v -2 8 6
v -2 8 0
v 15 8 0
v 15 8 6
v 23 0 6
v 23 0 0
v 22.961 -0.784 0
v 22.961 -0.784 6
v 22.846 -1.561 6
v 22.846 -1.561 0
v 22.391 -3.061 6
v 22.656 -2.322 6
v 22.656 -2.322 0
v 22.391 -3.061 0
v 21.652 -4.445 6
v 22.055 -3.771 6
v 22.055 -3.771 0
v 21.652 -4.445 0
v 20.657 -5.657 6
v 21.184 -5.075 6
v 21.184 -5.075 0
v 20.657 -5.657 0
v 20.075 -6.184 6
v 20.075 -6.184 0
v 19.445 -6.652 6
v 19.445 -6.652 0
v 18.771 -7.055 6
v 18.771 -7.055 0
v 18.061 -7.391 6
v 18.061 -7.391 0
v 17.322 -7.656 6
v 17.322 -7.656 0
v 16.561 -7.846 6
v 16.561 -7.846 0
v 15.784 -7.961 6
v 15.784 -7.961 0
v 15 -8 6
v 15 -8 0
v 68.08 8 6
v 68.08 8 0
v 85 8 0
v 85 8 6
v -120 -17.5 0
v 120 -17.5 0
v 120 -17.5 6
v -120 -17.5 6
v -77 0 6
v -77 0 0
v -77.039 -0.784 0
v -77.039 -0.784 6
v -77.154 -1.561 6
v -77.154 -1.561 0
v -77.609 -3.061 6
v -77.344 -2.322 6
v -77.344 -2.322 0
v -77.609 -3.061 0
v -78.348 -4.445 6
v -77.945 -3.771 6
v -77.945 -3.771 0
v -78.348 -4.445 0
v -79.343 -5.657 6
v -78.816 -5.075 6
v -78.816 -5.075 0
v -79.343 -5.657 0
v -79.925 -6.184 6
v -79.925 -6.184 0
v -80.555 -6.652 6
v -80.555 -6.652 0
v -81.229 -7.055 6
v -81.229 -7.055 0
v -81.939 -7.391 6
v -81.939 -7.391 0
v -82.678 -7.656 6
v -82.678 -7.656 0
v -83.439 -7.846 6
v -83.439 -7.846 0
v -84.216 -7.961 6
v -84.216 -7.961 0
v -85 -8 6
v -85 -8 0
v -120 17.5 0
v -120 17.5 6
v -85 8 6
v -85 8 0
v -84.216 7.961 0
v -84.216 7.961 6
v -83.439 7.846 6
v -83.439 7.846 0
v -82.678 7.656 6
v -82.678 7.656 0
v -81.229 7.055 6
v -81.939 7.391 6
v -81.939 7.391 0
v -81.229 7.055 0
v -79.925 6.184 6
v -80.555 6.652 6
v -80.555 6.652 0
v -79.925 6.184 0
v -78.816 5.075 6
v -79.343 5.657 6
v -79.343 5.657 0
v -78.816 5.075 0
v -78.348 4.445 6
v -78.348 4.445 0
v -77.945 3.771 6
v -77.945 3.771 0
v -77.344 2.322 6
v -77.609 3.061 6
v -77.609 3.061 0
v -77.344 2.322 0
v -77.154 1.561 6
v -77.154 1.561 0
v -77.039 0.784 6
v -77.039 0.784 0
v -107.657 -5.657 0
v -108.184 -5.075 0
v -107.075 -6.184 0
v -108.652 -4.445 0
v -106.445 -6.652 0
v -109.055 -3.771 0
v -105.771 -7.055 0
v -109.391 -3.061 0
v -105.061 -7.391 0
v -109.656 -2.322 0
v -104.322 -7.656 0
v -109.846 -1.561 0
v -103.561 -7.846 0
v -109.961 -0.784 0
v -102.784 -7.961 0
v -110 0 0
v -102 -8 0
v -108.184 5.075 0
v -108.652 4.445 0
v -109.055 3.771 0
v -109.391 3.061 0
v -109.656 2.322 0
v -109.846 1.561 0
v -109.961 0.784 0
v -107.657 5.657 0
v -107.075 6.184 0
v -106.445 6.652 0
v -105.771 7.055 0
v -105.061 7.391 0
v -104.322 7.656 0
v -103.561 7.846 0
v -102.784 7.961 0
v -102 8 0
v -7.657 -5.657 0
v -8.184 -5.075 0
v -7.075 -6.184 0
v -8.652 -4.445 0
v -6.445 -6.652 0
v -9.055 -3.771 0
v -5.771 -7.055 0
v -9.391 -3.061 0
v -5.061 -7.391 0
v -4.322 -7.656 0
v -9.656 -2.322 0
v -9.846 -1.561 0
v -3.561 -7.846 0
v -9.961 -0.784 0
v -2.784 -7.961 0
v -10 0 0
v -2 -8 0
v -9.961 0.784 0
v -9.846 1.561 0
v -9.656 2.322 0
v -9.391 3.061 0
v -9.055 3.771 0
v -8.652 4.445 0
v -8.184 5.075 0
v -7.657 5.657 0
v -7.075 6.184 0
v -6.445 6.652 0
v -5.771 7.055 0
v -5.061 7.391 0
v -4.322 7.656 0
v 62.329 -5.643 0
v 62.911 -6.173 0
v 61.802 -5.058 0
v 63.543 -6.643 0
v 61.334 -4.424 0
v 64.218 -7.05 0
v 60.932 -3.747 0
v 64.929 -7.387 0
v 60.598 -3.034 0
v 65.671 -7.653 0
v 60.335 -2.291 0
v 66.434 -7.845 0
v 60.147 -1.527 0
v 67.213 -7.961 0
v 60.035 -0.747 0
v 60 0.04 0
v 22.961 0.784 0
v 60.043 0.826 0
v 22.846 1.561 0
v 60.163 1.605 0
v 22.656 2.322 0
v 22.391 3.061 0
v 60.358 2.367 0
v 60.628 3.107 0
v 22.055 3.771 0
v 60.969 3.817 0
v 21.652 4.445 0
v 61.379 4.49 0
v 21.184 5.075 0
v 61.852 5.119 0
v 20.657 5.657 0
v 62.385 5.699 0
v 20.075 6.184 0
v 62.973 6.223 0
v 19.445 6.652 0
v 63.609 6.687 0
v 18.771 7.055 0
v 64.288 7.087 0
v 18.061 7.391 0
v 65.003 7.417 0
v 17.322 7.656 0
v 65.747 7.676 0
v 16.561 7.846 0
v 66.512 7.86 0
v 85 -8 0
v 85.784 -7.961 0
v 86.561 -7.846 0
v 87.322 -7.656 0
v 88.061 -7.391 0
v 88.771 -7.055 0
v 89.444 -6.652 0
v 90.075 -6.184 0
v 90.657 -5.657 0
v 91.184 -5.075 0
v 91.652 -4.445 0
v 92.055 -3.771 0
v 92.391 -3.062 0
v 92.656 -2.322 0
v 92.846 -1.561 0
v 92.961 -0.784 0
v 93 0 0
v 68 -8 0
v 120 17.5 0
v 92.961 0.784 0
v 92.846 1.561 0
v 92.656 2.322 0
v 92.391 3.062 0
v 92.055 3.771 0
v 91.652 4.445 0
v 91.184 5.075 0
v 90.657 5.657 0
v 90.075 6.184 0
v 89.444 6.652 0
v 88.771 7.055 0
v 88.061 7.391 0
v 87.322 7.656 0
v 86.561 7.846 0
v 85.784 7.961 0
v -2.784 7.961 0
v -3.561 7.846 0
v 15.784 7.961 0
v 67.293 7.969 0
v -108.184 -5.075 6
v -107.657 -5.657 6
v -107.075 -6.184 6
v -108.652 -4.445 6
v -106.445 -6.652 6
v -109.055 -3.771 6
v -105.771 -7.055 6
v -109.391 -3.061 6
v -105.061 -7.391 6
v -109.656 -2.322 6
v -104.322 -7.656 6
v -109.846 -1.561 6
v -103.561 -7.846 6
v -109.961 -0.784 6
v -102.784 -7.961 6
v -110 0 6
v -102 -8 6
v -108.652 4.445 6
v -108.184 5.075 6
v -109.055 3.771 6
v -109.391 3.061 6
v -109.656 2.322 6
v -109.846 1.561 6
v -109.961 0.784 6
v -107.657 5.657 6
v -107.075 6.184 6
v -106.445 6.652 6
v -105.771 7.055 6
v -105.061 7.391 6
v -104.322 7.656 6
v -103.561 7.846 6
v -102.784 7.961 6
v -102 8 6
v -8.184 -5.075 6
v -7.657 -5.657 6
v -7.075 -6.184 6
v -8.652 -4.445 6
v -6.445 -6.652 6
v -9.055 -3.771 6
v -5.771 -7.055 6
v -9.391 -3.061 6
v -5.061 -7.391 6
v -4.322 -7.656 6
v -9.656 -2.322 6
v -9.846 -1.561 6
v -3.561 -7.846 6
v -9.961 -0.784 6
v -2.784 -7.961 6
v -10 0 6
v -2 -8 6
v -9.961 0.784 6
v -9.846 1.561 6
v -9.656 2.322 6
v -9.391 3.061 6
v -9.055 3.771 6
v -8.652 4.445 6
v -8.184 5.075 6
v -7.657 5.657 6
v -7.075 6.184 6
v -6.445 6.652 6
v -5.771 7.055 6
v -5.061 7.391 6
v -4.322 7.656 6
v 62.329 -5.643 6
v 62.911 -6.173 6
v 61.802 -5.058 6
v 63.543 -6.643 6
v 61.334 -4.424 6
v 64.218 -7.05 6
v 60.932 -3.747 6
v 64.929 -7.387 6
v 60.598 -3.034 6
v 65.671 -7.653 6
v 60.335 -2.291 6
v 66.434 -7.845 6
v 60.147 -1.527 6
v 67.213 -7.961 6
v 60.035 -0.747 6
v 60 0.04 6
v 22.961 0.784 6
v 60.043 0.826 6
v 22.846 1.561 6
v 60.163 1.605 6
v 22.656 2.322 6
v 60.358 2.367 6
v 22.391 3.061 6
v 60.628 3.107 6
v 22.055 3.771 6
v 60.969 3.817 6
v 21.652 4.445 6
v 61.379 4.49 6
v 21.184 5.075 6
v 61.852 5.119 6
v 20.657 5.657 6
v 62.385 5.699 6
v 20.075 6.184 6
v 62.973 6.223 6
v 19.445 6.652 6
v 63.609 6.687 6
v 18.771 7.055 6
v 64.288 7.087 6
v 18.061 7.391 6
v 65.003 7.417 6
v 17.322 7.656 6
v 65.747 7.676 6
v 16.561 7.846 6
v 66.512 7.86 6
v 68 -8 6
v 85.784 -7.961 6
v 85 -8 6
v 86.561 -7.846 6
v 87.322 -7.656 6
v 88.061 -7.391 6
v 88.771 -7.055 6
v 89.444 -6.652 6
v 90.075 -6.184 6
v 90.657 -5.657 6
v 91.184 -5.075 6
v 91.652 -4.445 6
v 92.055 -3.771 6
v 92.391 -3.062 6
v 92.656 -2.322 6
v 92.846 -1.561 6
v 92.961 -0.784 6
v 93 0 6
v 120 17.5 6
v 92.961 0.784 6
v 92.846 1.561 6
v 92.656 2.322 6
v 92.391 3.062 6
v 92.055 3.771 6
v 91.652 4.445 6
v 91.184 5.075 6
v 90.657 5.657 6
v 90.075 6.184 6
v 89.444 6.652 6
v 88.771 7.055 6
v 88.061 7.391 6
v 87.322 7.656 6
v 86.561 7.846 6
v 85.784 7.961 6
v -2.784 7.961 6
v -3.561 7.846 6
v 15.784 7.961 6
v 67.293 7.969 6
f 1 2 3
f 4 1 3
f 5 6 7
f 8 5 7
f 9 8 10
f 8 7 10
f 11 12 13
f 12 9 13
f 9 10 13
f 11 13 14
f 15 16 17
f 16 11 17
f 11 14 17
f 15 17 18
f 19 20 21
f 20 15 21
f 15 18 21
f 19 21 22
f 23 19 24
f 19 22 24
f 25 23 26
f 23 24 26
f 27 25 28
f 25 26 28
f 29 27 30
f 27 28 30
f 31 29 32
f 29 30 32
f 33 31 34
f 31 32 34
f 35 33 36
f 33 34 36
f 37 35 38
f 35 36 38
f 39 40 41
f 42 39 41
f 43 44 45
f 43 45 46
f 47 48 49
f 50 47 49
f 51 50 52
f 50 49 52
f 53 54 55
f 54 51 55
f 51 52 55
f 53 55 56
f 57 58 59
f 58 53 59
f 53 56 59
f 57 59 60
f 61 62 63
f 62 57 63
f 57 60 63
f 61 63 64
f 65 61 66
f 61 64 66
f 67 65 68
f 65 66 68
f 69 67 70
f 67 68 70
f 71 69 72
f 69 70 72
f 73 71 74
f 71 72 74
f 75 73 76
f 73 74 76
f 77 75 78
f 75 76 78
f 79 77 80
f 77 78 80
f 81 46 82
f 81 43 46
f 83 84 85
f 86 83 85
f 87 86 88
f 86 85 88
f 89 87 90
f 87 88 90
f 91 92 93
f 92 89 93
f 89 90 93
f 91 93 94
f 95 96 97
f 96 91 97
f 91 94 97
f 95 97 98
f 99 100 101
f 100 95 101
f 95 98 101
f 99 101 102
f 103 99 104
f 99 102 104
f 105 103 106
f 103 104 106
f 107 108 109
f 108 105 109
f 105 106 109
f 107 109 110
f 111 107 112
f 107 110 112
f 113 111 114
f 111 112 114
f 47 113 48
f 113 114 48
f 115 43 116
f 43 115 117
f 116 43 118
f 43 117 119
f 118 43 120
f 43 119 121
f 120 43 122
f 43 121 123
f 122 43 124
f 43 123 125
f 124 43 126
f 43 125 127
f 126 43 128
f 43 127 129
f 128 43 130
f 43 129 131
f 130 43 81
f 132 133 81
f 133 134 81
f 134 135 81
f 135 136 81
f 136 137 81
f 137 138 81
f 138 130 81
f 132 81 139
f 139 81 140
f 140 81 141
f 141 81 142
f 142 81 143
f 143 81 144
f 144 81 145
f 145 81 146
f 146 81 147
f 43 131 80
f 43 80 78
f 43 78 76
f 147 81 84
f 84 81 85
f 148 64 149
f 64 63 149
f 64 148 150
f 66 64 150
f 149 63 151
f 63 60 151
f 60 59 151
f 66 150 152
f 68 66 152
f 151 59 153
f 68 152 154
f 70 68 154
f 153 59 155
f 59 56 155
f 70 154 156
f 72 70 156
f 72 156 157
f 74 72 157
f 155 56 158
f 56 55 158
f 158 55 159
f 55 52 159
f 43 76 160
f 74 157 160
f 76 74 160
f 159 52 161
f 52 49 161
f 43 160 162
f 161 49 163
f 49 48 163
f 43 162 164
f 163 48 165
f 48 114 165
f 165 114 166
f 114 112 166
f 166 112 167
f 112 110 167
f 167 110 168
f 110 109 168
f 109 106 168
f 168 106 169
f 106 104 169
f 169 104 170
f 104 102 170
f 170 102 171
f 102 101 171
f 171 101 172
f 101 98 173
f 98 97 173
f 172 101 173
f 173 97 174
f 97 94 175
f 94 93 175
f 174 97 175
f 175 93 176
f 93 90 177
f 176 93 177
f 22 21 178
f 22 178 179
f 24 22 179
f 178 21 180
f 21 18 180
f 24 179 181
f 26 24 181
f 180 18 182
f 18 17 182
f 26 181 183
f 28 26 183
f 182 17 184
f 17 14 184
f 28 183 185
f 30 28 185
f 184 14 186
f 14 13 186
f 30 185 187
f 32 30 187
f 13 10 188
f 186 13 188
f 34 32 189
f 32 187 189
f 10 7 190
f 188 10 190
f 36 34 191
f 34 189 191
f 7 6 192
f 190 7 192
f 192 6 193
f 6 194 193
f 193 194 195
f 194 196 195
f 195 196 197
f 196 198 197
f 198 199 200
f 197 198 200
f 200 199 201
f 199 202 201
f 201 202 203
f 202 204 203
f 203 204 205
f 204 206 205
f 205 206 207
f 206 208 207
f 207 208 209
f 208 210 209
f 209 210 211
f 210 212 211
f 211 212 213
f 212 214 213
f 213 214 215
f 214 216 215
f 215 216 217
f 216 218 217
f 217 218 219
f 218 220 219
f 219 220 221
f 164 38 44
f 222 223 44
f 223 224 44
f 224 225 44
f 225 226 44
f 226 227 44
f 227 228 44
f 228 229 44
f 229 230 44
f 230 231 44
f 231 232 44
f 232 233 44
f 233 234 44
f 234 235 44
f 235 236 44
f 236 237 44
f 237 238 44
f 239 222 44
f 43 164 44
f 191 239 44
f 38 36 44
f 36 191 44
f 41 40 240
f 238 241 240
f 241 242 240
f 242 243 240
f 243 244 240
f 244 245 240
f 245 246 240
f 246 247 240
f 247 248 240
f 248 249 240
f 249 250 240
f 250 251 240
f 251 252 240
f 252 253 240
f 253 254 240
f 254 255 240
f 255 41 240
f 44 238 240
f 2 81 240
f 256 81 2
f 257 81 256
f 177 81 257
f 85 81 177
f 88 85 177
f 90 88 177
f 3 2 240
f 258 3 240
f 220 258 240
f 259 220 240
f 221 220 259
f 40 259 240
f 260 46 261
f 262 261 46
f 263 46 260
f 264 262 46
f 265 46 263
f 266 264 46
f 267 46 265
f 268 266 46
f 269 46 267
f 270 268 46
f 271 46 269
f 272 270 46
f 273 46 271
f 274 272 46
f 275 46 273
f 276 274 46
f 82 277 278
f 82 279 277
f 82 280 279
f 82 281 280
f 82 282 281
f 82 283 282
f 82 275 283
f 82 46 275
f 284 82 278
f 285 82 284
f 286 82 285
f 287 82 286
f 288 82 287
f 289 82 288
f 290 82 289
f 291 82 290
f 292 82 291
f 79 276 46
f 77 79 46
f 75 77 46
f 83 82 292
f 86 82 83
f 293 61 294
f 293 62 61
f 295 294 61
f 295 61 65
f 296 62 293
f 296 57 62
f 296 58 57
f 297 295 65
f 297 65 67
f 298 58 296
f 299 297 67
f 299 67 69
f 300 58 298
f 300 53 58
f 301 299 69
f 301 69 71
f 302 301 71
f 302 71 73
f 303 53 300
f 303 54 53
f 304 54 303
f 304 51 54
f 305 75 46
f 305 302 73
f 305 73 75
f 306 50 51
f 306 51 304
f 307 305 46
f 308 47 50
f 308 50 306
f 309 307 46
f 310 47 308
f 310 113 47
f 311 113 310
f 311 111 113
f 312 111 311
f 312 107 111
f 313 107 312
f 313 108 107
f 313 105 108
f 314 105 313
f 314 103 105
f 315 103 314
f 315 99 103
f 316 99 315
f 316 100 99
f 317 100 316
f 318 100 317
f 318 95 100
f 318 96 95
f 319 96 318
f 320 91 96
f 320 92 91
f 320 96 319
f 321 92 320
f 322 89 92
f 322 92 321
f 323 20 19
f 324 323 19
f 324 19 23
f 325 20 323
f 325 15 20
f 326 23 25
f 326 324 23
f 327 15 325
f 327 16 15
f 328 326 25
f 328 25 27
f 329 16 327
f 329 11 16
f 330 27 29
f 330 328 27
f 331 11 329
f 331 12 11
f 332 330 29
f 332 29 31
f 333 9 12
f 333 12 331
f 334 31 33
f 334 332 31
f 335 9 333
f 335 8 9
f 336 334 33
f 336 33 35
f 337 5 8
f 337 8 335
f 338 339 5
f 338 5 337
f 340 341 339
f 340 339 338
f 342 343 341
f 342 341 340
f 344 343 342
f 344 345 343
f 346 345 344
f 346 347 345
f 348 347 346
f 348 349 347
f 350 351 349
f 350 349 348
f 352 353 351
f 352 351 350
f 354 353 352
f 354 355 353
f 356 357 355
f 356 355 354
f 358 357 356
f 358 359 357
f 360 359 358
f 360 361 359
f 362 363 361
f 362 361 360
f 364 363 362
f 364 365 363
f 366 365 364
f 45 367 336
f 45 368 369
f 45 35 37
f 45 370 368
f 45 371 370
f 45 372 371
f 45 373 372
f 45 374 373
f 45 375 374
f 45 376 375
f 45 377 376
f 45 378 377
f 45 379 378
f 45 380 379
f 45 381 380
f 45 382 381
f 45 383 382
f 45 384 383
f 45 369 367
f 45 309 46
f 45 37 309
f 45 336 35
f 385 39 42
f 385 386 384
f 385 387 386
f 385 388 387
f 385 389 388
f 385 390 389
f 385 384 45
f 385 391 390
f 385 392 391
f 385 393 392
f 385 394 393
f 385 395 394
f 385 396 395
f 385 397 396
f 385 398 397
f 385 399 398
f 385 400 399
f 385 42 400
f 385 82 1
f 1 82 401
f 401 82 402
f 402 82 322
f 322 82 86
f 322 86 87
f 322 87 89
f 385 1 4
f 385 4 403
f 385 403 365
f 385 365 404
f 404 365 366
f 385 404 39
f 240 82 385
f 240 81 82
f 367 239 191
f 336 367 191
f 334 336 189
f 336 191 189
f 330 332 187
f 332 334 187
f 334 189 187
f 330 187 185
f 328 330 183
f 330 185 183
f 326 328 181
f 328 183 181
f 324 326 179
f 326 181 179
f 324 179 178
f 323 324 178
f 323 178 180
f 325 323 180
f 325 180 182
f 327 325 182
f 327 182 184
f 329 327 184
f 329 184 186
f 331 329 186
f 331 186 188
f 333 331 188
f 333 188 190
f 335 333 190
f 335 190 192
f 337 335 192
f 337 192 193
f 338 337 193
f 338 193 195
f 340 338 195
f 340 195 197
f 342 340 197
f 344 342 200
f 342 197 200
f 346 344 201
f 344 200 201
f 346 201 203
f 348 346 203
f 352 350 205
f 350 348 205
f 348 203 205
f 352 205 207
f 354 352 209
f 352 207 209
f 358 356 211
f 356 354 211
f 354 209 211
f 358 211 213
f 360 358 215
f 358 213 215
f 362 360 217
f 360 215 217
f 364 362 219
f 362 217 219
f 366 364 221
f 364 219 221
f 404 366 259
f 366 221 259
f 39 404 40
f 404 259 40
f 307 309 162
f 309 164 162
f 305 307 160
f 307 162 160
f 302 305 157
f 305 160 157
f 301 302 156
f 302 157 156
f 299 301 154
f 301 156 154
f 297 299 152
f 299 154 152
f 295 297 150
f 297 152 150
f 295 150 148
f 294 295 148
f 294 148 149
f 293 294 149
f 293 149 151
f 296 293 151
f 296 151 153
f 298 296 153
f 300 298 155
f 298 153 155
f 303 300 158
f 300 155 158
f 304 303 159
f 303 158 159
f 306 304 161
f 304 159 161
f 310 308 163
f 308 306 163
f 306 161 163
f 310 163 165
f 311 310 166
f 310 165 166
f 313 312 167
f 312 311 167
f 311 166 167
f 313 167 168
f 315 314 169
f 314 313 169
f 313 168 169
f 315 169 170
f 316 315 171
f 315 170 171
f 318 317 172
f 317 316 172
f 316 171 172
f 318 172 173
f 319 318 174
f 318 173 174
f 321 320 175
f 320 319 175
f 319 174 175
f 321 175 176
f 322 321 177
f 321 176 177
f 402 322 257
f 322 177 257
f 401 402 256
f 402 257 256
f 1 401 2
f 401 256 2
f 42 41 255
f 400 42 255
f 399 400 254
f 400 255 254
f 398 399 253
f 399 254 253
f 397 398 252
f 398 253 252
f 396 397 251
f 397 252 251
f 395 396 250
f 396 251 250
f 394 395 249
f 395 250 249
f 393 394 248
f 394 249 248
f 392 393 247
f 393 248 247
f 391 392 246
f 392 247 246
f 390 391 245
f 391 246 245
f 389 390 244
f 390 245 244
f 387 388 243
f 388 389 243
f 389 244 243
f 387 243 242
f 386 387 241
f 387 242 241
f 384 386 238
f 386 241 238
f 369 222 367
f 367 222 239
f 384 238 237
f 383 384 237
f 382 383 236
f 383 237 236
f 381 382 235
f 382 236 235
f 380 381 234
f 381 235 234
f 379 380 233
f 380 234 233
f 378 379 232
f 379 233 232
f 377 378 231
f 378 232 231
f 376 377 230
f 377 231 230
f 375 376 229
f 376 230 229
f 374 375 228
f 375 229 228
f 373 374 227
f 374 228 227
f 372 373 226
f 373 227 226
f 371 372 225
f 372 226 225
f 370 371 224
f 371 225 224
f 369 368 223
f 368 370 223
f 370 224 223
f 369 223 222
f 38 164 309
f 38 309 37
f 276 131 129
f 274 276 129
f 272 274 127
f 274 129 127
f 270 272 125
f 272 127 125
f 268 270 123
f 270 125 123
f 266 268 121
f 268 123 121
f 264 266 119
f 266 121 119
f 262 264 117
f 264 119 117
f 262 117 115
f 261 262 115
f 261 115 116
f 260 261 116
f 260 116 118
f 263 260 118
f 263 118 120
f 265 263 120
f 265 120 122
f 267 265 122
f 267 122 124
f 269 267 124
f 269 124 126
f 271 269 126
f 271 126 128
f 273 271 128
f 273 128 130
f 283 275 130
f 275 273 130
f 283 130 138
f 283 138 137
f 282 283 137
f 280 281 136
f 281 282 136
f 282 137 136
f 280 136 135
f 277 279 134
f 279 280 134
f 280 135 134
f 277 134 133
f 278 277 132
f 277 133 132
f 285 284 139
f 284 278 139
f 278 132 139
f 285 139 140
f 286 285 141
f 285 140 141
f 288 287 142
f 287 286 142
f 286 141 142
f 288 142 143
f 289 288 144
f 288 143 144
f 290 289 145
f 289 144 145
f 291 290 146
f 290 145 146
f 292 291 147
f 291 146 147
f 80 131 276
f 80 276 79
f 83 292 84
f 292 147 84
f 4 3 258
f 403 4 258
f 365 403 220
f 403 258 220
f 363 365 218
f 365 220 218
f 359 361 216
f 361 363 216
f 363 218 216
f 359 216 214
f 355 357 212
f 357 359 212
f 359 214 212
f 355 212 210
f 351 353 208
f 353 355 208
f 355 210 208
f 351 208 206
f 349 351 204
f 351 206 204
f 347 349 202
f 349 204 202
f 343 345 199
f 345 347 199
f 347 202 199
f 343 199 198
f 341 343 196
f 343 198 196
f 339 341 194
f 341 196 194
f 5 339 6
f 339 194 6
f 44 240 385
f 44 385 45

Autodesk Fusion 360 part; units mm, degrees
sketch "スケッチ1" plane through (0, 0, 0) normal (0, 0, 1) x (1, 0, 0)
  line L0 (120, -17.5) -> (-120, -17.5)
  line L1 (-120, -17.5) -> (-120, 17.5)
  line L2 (-120, 17.5) -> (120, 17.5)
  line L3 (120, 17.5) -> (120, -17.5)
  line L4 (120, -17.5) -> (-120, 17.5) construction
  line L5 (-120, -17.5) -> (120, 17.5) construction
  circle A0 centre (-102, 0) radius 8
  circle A1 centre (-2, 0) radius 8
  circle A2 centre (15, 0) radius 8
  line L6 (-2, -8) -> (15, -8)
  line L7 (-2, 8) -> (15, 8)
  circle A3 centre (68, 0) radius 8
  circle A4 centre (85, 0) radius 8
  line L8 (68.0795, 7.9996) -> (84.9998, 8)
  line L9 (84.9998, -8) -> (68, -8)
  circle A5 centre (-85, 0) radius 8
  line L10 (-102, 8) -> (-85, 8)
  line L11 (-102, -8) -> (-85, -8)
  point P0 (-110, 0)
  point P1 (-102, 0)
  point P2 (-94, 0)
  point P3 (-102, 8)
  point P4 (-10, 0)
  point P5 (23, 0)
  point P6 (-2, 0)
  point P7 (15, 0)
  point P8 (60, 0)
  point P9 (68, 0)
  point P10 (85, 0)
  point P11 (93, 0)
  point P12 (-77, 0)
  point P13 (-85, 0)
  dimension "d1" = 240
  dimension "d2" = 35
  dimension "d3" = 10
  dimension "d4" = 8
  dimension "d5" = 16
  dimension "d8" = 100
  dimension "d9" = 33
  dimension "d10" = 8
  dimension "d11" = 16
  dimension "d12" = 8
  dimension "d13" = 16
  dimension "d14" = 70
  dimension "d15" = 8
  dimension "d16" = 16
  dimension "d17" = 33
  dimension "d18" = 8
  dimension "d19" = 16
  dimension "d20" = 33
  dimension "d21" = 8
  dimension "d22" = 16
  dimension "d23" = 27
extrude "押し出し1" add sketch "スケッチ1" along normal blind 6
